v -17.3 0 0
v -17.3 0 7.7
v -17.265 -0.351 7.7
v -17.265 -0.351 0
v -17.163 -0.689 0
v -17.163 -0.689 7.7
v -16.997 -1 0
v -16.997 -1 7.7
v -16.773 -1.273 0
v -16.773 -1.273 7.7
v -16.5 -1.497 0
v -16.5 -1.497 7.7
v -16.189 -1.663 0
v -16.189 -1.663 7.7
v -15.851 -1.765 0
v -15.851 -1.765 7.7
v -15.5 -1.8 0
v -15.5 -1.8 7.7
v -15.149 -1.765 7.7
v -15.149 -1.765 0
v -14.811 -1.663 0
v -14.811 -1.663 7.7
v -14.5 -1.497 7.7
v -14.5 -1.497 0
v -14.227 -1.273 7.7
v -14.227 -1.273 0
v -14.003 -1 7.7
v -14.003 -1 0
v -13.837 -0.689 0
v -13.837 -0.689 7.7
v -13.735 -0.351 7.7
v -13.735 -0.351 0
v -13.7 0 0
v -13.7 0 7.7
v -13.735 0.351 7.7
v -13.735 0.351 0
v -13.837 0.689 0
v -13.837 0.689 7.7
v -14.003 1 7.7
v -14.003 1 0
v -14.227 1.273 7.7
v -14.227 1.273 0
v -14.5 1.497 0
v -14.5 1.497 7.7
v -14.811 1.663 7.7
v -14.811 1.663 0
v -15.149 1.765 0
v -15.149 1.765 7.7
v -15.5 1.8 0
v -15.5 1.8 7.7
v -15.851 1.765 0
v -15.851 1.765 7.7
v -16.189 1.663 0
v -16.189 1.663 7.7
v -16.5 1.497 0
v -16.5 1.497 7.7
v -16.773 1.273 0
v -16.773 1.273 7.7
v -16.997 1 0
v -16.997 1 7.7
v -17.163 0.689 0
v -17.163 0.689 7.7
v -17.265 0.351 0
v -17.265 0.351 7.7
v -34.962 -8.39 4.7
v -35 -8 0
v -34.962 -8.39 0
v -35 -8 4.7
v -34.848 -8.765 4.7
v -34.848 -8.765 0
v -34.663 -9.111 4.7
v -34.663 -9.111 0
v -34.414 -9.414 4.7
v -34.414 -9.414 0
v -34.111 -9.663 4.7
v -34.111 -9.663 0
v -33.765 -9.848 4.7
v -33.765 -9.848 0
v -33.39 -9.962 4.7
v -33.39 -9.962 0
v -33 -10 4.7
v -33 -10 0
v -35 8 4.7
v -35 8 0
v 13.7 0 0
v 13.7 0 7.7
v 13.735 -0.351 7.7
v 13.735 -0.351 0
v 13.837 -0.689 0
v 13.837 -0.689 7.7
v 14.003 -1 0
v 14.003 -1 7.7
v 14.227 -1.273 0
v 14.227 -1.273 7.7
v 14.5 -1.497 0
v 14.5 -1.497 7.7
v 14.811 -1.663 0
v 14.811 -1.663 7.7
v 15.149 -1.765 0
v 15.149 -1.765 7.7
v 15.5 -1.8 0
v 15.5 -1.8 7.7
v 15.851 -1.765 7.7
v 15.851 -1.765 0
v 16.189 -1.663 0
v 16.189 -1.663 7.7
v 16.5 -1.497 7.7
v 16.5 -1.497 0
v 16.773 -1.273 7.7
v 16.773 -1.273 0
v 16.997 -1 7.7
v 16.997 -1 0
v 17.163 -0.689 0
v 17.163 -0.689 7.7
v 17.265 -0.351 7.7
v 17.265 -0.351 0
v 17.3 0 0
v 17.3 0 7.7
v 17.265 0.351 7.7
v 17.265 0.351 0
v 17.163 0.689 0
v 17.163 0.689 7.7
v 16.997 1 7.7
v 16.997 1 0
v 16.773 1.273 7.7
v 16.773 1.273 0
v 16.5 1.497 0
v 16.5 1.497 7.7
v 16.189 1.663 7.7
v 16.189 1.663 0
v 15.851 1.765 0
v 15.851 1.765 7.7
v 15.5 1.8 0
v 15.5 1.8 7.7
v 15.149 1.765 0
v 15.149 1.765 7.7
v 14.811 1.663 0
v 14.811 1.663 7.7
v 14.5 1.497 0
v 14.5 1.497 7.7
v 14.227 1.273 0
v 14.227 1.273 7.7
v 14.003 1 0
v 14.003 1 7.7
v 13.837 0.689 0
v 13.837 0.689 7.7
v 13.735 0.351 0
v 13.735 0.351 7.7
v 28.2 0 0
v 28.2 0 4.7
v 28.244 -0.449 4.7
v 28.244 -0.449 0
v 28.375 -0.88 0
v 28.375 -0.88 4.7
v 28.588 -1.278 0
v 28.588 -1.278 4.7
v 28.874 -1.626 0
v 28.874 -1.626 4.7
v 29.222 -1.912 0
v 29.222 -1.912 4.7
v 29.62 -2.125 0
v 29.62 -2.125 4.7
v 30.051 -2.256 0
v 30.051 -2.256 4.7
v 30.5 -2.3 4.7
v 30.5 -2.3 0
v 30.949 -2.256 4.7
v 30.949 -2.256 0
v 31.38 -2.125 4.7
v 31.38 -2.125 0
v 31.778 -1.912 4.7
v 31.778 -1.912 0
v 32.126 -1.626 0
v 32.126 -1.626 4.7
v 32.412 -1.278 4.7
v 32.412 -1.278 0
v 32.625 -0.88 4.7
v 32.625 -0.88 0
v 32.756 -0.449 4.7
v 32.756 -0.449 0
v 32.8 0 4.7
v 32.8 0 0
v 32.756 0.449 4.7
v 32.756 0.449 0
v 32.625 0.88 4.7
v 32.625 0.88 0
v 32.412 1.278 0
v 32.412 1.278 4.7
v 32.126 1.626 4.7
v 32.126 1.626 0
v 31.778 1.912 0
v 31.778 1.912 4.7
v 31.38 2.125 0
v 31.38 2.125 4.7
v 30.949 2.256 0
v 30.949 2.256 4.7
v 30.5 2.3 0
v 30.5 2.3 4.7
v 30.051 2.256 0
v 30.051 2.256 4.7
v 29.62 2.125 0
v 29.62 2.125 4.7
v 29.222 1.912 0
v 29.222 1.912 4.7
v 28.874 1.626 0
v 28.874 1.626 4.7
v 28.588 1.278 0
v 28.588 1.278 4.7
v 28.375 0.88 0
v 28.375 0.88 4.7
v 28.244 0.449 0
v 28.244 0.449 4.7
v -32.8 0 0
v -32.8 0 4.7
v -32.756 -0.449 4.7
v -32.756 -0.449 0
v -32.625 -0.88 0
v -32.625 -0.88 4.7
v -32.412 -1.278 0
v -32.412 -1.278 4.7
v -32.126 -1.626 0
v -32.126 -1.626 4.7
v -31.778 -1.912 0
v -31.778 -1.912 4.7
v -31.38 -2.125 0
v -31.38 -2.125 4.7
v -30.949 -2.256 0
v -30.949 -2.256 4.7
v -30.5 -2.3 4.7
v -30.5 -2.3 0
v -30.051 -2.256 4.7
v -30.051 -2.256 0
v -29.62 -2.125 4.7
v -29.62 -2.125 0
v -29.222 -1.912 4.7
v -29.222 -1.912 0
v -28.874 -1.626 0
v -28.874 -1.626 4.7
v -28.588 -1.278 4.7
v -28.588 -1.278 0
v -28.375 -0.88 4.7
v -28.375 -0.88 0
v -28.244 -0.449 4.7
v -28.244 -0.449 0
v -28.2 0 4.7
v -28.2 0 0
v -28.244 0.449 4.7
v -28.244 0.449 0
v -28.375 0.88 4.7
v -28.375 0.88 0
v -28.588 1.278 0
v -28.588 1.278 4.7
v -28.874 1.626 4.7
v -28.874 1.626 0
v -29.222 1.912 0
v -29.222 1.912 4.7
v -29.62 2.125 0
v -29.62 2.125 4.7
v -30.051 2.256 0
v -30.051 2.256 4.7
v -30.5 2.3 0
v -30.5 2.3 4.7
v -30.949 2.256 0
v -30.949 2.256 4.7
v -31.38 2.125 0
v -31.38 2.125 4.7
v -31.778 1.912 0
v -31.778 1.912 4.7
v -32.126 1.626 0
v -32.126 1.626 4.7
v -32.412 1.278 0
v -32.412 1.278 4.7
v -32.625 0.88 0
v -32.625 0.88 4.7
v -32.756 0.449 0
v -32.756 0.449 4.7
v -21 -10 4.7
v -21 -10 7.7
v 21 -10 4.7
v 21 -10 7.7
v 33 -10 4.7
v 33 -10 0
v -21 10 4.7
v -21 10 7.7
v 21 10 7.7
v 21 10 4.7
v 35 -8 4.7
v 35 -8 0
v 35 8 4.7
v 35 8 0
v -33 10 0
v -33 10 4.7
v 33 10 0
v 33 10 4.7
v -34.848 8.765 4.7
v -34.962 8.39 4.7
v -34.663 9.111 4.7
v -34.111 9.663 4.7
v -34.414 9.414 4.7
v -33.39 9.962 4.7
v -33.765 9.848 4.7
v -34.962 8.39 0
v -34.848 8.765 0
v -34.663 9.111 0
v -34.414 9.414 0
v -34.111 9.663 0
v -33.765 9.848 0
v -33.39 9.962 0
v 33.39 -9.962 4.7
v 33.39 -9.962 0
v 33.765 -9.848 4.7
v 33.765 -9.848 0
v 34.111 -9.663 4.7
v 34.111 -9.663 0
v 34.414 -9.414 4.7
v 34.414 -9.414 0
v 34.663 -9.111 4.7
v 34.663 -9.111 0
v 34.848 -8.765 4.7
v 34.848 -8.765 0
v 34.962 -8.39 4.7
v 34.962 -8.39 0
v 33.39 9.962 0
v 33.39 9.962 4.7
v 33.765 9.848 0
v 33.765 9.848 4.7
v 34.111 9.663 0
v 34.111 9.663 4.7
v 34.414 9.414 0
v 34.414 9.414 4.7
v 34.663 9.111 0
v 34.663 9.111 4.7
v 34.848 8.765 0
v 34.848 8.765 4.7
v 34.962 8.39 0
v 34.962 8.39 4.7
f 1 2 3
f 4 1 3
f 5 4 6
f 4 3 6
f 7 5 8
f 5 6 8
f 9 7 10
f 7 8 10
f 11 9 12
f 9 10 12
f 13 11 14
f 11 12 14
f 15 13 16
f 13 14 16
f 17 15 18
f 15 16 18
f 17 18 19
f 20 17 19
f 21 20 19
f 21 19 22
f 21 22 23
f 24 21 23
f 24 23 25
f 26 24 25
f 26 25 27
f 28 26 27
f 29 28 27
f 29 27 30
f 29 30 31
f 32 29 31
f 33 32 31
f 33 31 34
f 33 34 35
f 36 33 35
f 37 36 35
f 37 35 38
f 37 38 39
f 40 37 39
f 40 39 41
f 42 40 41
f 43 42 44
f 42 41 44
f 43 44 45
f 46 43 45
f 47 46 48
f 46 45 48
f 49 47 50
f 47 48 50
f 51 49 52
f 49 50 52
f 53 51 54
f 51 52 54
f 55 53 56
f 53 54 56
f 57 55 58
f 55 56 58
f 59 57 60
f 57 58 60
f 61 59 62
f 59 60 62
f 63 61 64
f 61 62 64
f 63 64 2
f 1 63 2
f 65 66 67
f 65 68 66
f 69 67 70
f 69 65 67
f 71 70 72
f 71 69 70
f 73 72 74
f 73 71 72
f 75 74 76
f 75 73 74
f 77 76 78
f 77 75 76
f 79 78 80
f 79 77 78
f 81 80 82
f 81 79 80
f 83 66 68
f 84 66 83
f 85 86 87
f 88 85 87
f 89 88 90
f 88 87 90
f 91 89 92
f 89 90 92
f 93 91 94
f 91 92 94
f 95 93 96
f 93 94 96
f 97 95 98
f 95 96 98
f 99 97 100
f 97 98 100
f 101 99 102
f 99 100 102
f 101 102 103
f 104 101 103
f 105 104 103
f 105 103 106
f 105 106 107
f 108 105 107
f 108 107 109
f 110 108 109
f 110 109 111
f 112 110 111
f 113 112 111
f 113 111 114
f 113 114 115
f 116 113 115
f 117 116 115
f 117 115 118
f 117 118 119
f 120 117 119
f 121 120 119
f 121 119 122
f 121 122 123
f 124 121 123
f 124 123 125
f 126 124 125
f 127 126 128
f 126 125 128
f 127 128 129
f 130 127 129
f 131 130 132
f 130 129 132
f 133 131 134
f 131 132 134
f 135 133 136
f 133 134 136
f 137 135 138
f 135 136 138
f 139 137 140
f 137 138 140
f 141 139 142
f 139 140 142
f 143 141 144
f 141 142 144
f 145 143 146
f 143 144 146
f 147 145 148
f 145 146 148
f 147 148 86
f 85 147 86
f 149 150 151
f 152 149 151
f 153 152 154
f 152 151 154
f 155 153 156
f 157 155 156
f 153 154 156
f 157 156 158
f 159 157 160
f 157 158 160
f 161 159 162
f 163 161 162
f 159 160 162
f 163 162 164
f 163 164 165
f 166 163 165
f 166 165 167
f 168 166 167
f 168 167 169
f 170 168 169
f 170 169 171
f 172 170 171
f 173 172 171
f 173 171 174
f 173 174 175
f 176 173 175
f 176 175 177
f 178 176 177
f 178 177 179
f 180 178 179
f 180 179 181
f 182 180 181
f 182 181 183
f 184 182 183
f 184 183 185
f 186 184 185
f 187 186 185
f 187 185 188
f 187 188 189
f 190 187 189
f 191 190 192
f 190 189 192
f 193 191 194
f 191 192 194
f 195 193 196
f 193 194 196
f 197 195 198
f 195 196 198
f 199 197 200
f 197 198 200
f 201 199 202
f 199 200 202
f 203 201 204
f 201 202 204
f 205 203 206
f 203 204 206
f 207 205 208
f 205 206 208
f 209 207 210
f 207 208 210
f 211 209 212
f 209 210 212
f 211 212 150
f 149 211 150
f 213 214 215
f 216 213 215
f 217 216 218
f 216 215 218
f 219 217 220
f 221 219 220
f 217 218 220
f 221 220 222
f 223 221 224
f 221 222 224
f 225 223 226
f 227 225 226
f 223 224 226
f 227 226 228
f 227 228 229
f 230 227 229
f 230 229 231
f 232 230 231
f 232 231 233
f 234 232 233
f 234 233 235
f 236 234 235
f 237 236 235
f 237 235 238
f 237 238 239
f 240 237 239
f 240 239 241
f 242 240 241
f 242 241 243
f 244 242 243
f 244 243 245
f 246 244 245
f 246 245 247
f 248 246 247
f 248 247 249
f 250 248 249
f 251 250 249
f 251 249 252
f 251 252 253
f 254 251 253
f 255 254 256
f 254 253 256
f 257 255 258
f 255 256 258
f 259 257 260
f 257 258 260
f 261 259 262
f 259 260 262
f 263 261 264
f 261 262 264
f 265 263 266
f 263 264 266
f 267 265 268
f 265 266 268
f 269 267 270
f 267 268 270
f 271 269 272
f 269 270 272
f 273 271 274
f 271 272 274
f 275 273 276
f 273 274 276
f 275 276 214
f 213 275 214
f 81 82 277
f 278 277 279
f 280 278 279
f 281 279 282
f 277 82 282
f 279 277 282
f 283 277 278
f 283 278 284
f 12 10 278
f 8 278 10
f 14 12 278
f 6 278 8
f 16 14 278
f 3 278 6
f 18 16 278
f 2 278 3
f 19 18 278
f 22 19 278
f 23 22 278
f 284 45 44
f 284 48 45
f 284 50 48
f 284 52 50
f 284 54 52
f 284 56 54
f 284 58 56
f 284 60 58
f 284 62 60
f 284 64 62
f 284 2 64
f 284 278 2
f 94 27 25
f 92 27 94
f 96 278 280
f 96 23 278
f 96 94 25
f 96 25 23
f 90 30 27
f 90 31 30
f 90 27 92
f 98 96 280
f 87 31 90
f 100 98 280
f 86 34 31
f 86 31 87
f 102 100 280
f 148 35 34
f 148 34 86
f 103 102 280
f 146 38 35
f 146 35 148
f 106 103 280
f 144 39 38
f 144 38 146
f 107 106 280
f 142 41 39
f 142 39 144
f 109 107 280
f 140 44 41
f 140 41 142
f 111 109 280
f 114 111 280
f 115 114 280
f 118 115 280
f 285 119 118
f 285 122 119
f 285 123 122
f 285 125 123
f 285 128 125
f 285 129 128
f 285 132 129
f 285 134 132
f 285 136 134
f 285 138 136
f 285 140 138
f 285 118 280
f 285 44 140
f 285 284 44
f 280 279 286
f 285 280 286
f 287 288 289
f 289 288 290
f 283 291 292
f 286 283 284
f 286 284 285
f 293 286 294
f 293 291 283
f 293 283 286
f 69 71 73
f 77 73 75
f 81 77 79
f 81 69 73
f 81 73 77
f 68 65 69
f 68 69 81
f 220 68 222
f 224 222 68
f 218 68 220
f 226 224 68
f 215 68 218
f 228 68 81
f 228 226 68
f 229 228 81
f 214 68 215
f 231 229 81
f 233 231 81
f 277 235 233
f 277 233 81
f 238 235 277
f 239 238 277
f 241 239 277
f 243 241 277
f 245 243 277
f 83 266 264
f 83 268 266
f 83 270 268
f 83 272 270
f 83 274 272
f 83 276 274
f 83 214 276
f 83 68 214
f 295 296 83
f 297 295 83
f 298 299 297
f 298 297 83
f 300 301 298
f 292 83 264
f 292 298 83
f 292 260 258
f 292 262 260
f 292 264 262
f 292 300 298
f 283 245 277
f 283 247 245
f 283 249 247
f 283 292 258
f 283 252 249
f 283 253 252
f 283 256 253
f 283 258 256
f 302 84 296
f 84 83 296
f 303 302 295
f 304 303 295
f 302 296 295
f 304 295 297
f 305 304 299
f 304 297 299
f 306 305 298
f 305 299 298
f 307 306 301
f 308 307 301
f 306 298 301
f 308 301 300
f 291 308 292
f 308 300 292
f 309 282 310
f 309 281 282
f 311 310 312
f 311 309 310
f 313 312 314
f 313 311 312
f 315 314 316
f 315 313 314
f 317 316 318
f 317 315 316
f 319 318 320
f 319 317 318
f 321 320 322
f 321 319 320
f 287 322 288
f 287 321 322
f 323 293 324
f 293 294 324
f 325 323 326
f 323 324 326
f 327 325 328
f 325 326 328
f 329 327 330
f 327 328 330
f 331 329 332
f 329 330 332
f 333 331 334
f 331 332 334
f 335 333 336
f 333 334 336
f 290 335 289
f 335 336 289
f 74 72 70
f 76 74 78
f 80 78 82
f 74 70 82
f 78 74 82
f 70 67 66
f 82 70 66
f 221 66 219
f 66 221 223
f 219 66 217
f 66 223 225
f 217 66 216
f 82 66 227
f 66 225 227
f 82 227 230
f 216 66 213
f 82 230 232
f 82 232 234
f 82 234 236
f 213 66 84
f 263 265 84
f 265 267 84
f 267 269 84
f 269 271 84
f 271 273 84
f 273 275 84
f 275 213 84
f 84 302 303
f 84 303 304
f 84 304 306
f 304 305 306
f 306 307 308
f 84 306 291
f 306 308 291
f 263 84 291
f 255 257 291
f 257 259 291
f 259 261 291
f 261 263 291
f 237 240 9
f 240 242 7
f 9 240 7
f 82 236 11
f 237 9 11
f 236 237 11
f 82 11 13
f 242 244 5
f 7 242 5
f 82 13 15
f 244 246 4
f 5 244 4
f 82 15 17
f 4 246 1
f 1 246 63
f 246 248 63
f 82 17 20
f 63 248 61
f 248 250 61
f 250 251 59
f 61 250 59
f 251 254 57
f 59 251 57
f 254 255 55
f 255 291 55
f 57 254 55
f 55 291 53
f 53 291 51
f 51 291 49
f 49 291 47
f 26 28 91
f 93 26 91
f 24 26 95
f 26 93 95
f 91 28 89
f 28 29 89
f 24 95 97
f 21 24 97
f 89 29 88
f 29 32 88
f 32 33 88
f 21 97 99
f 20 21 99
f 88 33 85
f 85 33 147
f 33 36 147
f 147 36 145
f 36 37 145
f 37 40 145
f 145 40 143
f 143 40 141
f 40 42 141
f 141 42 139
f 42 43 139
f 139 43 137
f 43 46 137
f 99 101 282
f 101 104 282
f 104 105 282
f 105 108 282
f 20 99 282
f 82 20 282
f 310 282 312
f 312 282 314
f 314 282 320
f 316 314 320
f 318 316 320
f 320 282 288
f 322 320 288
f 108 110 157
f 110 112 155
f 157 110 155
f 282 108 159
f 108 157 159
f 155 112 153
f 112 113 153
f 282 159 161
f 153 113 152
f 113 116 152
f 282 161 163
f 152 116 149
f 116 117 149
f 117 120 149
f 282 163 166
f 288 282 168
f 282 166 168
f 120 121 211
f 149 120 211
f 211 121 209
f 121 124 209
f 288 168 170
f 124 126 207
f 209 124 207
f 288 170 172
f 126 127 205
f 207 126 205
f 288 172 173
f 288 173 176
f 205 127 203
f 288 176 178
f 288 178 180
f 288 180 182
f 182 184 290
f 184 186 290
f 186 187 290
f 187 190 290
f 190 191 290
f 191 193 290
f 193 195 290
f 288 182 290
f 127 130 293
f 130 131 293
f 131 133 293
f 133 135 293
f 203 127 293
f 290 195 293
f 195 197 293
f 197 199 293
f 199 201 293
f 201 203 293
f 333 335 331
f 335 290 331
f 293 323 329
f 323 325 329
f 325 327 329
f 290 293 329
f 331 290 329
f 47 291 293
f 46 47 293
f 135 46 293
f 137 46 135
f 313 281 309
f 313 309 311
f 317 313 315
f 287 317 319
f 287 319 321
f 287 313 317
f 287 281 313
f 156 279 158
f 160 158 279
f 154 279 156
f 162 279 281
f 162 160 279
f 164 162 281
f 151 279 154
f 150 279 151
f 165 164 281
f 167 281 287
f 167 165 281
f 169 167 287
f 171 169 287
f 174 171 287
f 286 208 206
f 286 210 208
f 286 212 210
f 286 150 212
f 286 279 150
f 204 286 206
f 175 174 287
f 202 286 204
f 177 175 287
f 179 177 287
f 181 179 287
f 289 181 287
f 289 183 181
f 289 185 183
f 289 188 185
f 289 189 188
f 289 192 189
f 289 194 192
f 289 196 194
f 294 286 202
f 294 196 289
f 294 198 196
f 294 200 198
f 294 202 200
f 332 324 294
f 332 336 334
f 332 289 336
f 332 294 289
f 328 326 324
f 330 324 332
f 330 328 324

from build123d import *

# Parameters (mm, degrees)
F0_W     = 70
F0_H     = 20
F1_DEPTH = 4.7
F2_W     = 42
F2_H     = 20
F3_DEPTH = 3
F4_D     = 3.6
F4_DEPTH = 12
F5_D     = 4.6
F5_DEPTH = 12
F6_R     = 2


with BuildPart() as f1:
    # F0 (on Top) → F1 (new body)
    with BuildSketch(Plane.XY):
        Rectangle(F0_W, F0_H)
    extrude(amount=F1_DEPTH)

    # F2 (on face) → F3 (join)
    with BuildSketch(Plane.XY.offset(4.7)):
        Rectangle(F2_W, F2_H)
    extrude(amount=F3_DEPTH)

    # F4
    with Locations(Plane(origin=(0, 0, 0), x_dir=(1, 0, 0), z_dir=(0, 0, -1))):
        with Locations((-15.5, 0), (15.5, 0)):
            Hole(F4_D / 2, depth=F4_DEPTH)

    # F5
    with Locations(Plane(origin=(0, 0, 0), x_dir=(1, 0, 0), z_dir=(0, 0, -1))):
        with Locations((-30.5, 0), (30.5, 0)):
            Hole(F5_D / 2, depth=F5_DEPTH)

    # F6
    f6_edges = [f1.edges().sort_by_distance(p)[0] for p in [
        (35, -10, 2.35),
        (35, 10, 2.35),
        (-35, 10, 2.35),
        (-35, -10, 2.35),
    ]]
    fillet(f6_edges, radius=F6_R)


solid = f1.part
